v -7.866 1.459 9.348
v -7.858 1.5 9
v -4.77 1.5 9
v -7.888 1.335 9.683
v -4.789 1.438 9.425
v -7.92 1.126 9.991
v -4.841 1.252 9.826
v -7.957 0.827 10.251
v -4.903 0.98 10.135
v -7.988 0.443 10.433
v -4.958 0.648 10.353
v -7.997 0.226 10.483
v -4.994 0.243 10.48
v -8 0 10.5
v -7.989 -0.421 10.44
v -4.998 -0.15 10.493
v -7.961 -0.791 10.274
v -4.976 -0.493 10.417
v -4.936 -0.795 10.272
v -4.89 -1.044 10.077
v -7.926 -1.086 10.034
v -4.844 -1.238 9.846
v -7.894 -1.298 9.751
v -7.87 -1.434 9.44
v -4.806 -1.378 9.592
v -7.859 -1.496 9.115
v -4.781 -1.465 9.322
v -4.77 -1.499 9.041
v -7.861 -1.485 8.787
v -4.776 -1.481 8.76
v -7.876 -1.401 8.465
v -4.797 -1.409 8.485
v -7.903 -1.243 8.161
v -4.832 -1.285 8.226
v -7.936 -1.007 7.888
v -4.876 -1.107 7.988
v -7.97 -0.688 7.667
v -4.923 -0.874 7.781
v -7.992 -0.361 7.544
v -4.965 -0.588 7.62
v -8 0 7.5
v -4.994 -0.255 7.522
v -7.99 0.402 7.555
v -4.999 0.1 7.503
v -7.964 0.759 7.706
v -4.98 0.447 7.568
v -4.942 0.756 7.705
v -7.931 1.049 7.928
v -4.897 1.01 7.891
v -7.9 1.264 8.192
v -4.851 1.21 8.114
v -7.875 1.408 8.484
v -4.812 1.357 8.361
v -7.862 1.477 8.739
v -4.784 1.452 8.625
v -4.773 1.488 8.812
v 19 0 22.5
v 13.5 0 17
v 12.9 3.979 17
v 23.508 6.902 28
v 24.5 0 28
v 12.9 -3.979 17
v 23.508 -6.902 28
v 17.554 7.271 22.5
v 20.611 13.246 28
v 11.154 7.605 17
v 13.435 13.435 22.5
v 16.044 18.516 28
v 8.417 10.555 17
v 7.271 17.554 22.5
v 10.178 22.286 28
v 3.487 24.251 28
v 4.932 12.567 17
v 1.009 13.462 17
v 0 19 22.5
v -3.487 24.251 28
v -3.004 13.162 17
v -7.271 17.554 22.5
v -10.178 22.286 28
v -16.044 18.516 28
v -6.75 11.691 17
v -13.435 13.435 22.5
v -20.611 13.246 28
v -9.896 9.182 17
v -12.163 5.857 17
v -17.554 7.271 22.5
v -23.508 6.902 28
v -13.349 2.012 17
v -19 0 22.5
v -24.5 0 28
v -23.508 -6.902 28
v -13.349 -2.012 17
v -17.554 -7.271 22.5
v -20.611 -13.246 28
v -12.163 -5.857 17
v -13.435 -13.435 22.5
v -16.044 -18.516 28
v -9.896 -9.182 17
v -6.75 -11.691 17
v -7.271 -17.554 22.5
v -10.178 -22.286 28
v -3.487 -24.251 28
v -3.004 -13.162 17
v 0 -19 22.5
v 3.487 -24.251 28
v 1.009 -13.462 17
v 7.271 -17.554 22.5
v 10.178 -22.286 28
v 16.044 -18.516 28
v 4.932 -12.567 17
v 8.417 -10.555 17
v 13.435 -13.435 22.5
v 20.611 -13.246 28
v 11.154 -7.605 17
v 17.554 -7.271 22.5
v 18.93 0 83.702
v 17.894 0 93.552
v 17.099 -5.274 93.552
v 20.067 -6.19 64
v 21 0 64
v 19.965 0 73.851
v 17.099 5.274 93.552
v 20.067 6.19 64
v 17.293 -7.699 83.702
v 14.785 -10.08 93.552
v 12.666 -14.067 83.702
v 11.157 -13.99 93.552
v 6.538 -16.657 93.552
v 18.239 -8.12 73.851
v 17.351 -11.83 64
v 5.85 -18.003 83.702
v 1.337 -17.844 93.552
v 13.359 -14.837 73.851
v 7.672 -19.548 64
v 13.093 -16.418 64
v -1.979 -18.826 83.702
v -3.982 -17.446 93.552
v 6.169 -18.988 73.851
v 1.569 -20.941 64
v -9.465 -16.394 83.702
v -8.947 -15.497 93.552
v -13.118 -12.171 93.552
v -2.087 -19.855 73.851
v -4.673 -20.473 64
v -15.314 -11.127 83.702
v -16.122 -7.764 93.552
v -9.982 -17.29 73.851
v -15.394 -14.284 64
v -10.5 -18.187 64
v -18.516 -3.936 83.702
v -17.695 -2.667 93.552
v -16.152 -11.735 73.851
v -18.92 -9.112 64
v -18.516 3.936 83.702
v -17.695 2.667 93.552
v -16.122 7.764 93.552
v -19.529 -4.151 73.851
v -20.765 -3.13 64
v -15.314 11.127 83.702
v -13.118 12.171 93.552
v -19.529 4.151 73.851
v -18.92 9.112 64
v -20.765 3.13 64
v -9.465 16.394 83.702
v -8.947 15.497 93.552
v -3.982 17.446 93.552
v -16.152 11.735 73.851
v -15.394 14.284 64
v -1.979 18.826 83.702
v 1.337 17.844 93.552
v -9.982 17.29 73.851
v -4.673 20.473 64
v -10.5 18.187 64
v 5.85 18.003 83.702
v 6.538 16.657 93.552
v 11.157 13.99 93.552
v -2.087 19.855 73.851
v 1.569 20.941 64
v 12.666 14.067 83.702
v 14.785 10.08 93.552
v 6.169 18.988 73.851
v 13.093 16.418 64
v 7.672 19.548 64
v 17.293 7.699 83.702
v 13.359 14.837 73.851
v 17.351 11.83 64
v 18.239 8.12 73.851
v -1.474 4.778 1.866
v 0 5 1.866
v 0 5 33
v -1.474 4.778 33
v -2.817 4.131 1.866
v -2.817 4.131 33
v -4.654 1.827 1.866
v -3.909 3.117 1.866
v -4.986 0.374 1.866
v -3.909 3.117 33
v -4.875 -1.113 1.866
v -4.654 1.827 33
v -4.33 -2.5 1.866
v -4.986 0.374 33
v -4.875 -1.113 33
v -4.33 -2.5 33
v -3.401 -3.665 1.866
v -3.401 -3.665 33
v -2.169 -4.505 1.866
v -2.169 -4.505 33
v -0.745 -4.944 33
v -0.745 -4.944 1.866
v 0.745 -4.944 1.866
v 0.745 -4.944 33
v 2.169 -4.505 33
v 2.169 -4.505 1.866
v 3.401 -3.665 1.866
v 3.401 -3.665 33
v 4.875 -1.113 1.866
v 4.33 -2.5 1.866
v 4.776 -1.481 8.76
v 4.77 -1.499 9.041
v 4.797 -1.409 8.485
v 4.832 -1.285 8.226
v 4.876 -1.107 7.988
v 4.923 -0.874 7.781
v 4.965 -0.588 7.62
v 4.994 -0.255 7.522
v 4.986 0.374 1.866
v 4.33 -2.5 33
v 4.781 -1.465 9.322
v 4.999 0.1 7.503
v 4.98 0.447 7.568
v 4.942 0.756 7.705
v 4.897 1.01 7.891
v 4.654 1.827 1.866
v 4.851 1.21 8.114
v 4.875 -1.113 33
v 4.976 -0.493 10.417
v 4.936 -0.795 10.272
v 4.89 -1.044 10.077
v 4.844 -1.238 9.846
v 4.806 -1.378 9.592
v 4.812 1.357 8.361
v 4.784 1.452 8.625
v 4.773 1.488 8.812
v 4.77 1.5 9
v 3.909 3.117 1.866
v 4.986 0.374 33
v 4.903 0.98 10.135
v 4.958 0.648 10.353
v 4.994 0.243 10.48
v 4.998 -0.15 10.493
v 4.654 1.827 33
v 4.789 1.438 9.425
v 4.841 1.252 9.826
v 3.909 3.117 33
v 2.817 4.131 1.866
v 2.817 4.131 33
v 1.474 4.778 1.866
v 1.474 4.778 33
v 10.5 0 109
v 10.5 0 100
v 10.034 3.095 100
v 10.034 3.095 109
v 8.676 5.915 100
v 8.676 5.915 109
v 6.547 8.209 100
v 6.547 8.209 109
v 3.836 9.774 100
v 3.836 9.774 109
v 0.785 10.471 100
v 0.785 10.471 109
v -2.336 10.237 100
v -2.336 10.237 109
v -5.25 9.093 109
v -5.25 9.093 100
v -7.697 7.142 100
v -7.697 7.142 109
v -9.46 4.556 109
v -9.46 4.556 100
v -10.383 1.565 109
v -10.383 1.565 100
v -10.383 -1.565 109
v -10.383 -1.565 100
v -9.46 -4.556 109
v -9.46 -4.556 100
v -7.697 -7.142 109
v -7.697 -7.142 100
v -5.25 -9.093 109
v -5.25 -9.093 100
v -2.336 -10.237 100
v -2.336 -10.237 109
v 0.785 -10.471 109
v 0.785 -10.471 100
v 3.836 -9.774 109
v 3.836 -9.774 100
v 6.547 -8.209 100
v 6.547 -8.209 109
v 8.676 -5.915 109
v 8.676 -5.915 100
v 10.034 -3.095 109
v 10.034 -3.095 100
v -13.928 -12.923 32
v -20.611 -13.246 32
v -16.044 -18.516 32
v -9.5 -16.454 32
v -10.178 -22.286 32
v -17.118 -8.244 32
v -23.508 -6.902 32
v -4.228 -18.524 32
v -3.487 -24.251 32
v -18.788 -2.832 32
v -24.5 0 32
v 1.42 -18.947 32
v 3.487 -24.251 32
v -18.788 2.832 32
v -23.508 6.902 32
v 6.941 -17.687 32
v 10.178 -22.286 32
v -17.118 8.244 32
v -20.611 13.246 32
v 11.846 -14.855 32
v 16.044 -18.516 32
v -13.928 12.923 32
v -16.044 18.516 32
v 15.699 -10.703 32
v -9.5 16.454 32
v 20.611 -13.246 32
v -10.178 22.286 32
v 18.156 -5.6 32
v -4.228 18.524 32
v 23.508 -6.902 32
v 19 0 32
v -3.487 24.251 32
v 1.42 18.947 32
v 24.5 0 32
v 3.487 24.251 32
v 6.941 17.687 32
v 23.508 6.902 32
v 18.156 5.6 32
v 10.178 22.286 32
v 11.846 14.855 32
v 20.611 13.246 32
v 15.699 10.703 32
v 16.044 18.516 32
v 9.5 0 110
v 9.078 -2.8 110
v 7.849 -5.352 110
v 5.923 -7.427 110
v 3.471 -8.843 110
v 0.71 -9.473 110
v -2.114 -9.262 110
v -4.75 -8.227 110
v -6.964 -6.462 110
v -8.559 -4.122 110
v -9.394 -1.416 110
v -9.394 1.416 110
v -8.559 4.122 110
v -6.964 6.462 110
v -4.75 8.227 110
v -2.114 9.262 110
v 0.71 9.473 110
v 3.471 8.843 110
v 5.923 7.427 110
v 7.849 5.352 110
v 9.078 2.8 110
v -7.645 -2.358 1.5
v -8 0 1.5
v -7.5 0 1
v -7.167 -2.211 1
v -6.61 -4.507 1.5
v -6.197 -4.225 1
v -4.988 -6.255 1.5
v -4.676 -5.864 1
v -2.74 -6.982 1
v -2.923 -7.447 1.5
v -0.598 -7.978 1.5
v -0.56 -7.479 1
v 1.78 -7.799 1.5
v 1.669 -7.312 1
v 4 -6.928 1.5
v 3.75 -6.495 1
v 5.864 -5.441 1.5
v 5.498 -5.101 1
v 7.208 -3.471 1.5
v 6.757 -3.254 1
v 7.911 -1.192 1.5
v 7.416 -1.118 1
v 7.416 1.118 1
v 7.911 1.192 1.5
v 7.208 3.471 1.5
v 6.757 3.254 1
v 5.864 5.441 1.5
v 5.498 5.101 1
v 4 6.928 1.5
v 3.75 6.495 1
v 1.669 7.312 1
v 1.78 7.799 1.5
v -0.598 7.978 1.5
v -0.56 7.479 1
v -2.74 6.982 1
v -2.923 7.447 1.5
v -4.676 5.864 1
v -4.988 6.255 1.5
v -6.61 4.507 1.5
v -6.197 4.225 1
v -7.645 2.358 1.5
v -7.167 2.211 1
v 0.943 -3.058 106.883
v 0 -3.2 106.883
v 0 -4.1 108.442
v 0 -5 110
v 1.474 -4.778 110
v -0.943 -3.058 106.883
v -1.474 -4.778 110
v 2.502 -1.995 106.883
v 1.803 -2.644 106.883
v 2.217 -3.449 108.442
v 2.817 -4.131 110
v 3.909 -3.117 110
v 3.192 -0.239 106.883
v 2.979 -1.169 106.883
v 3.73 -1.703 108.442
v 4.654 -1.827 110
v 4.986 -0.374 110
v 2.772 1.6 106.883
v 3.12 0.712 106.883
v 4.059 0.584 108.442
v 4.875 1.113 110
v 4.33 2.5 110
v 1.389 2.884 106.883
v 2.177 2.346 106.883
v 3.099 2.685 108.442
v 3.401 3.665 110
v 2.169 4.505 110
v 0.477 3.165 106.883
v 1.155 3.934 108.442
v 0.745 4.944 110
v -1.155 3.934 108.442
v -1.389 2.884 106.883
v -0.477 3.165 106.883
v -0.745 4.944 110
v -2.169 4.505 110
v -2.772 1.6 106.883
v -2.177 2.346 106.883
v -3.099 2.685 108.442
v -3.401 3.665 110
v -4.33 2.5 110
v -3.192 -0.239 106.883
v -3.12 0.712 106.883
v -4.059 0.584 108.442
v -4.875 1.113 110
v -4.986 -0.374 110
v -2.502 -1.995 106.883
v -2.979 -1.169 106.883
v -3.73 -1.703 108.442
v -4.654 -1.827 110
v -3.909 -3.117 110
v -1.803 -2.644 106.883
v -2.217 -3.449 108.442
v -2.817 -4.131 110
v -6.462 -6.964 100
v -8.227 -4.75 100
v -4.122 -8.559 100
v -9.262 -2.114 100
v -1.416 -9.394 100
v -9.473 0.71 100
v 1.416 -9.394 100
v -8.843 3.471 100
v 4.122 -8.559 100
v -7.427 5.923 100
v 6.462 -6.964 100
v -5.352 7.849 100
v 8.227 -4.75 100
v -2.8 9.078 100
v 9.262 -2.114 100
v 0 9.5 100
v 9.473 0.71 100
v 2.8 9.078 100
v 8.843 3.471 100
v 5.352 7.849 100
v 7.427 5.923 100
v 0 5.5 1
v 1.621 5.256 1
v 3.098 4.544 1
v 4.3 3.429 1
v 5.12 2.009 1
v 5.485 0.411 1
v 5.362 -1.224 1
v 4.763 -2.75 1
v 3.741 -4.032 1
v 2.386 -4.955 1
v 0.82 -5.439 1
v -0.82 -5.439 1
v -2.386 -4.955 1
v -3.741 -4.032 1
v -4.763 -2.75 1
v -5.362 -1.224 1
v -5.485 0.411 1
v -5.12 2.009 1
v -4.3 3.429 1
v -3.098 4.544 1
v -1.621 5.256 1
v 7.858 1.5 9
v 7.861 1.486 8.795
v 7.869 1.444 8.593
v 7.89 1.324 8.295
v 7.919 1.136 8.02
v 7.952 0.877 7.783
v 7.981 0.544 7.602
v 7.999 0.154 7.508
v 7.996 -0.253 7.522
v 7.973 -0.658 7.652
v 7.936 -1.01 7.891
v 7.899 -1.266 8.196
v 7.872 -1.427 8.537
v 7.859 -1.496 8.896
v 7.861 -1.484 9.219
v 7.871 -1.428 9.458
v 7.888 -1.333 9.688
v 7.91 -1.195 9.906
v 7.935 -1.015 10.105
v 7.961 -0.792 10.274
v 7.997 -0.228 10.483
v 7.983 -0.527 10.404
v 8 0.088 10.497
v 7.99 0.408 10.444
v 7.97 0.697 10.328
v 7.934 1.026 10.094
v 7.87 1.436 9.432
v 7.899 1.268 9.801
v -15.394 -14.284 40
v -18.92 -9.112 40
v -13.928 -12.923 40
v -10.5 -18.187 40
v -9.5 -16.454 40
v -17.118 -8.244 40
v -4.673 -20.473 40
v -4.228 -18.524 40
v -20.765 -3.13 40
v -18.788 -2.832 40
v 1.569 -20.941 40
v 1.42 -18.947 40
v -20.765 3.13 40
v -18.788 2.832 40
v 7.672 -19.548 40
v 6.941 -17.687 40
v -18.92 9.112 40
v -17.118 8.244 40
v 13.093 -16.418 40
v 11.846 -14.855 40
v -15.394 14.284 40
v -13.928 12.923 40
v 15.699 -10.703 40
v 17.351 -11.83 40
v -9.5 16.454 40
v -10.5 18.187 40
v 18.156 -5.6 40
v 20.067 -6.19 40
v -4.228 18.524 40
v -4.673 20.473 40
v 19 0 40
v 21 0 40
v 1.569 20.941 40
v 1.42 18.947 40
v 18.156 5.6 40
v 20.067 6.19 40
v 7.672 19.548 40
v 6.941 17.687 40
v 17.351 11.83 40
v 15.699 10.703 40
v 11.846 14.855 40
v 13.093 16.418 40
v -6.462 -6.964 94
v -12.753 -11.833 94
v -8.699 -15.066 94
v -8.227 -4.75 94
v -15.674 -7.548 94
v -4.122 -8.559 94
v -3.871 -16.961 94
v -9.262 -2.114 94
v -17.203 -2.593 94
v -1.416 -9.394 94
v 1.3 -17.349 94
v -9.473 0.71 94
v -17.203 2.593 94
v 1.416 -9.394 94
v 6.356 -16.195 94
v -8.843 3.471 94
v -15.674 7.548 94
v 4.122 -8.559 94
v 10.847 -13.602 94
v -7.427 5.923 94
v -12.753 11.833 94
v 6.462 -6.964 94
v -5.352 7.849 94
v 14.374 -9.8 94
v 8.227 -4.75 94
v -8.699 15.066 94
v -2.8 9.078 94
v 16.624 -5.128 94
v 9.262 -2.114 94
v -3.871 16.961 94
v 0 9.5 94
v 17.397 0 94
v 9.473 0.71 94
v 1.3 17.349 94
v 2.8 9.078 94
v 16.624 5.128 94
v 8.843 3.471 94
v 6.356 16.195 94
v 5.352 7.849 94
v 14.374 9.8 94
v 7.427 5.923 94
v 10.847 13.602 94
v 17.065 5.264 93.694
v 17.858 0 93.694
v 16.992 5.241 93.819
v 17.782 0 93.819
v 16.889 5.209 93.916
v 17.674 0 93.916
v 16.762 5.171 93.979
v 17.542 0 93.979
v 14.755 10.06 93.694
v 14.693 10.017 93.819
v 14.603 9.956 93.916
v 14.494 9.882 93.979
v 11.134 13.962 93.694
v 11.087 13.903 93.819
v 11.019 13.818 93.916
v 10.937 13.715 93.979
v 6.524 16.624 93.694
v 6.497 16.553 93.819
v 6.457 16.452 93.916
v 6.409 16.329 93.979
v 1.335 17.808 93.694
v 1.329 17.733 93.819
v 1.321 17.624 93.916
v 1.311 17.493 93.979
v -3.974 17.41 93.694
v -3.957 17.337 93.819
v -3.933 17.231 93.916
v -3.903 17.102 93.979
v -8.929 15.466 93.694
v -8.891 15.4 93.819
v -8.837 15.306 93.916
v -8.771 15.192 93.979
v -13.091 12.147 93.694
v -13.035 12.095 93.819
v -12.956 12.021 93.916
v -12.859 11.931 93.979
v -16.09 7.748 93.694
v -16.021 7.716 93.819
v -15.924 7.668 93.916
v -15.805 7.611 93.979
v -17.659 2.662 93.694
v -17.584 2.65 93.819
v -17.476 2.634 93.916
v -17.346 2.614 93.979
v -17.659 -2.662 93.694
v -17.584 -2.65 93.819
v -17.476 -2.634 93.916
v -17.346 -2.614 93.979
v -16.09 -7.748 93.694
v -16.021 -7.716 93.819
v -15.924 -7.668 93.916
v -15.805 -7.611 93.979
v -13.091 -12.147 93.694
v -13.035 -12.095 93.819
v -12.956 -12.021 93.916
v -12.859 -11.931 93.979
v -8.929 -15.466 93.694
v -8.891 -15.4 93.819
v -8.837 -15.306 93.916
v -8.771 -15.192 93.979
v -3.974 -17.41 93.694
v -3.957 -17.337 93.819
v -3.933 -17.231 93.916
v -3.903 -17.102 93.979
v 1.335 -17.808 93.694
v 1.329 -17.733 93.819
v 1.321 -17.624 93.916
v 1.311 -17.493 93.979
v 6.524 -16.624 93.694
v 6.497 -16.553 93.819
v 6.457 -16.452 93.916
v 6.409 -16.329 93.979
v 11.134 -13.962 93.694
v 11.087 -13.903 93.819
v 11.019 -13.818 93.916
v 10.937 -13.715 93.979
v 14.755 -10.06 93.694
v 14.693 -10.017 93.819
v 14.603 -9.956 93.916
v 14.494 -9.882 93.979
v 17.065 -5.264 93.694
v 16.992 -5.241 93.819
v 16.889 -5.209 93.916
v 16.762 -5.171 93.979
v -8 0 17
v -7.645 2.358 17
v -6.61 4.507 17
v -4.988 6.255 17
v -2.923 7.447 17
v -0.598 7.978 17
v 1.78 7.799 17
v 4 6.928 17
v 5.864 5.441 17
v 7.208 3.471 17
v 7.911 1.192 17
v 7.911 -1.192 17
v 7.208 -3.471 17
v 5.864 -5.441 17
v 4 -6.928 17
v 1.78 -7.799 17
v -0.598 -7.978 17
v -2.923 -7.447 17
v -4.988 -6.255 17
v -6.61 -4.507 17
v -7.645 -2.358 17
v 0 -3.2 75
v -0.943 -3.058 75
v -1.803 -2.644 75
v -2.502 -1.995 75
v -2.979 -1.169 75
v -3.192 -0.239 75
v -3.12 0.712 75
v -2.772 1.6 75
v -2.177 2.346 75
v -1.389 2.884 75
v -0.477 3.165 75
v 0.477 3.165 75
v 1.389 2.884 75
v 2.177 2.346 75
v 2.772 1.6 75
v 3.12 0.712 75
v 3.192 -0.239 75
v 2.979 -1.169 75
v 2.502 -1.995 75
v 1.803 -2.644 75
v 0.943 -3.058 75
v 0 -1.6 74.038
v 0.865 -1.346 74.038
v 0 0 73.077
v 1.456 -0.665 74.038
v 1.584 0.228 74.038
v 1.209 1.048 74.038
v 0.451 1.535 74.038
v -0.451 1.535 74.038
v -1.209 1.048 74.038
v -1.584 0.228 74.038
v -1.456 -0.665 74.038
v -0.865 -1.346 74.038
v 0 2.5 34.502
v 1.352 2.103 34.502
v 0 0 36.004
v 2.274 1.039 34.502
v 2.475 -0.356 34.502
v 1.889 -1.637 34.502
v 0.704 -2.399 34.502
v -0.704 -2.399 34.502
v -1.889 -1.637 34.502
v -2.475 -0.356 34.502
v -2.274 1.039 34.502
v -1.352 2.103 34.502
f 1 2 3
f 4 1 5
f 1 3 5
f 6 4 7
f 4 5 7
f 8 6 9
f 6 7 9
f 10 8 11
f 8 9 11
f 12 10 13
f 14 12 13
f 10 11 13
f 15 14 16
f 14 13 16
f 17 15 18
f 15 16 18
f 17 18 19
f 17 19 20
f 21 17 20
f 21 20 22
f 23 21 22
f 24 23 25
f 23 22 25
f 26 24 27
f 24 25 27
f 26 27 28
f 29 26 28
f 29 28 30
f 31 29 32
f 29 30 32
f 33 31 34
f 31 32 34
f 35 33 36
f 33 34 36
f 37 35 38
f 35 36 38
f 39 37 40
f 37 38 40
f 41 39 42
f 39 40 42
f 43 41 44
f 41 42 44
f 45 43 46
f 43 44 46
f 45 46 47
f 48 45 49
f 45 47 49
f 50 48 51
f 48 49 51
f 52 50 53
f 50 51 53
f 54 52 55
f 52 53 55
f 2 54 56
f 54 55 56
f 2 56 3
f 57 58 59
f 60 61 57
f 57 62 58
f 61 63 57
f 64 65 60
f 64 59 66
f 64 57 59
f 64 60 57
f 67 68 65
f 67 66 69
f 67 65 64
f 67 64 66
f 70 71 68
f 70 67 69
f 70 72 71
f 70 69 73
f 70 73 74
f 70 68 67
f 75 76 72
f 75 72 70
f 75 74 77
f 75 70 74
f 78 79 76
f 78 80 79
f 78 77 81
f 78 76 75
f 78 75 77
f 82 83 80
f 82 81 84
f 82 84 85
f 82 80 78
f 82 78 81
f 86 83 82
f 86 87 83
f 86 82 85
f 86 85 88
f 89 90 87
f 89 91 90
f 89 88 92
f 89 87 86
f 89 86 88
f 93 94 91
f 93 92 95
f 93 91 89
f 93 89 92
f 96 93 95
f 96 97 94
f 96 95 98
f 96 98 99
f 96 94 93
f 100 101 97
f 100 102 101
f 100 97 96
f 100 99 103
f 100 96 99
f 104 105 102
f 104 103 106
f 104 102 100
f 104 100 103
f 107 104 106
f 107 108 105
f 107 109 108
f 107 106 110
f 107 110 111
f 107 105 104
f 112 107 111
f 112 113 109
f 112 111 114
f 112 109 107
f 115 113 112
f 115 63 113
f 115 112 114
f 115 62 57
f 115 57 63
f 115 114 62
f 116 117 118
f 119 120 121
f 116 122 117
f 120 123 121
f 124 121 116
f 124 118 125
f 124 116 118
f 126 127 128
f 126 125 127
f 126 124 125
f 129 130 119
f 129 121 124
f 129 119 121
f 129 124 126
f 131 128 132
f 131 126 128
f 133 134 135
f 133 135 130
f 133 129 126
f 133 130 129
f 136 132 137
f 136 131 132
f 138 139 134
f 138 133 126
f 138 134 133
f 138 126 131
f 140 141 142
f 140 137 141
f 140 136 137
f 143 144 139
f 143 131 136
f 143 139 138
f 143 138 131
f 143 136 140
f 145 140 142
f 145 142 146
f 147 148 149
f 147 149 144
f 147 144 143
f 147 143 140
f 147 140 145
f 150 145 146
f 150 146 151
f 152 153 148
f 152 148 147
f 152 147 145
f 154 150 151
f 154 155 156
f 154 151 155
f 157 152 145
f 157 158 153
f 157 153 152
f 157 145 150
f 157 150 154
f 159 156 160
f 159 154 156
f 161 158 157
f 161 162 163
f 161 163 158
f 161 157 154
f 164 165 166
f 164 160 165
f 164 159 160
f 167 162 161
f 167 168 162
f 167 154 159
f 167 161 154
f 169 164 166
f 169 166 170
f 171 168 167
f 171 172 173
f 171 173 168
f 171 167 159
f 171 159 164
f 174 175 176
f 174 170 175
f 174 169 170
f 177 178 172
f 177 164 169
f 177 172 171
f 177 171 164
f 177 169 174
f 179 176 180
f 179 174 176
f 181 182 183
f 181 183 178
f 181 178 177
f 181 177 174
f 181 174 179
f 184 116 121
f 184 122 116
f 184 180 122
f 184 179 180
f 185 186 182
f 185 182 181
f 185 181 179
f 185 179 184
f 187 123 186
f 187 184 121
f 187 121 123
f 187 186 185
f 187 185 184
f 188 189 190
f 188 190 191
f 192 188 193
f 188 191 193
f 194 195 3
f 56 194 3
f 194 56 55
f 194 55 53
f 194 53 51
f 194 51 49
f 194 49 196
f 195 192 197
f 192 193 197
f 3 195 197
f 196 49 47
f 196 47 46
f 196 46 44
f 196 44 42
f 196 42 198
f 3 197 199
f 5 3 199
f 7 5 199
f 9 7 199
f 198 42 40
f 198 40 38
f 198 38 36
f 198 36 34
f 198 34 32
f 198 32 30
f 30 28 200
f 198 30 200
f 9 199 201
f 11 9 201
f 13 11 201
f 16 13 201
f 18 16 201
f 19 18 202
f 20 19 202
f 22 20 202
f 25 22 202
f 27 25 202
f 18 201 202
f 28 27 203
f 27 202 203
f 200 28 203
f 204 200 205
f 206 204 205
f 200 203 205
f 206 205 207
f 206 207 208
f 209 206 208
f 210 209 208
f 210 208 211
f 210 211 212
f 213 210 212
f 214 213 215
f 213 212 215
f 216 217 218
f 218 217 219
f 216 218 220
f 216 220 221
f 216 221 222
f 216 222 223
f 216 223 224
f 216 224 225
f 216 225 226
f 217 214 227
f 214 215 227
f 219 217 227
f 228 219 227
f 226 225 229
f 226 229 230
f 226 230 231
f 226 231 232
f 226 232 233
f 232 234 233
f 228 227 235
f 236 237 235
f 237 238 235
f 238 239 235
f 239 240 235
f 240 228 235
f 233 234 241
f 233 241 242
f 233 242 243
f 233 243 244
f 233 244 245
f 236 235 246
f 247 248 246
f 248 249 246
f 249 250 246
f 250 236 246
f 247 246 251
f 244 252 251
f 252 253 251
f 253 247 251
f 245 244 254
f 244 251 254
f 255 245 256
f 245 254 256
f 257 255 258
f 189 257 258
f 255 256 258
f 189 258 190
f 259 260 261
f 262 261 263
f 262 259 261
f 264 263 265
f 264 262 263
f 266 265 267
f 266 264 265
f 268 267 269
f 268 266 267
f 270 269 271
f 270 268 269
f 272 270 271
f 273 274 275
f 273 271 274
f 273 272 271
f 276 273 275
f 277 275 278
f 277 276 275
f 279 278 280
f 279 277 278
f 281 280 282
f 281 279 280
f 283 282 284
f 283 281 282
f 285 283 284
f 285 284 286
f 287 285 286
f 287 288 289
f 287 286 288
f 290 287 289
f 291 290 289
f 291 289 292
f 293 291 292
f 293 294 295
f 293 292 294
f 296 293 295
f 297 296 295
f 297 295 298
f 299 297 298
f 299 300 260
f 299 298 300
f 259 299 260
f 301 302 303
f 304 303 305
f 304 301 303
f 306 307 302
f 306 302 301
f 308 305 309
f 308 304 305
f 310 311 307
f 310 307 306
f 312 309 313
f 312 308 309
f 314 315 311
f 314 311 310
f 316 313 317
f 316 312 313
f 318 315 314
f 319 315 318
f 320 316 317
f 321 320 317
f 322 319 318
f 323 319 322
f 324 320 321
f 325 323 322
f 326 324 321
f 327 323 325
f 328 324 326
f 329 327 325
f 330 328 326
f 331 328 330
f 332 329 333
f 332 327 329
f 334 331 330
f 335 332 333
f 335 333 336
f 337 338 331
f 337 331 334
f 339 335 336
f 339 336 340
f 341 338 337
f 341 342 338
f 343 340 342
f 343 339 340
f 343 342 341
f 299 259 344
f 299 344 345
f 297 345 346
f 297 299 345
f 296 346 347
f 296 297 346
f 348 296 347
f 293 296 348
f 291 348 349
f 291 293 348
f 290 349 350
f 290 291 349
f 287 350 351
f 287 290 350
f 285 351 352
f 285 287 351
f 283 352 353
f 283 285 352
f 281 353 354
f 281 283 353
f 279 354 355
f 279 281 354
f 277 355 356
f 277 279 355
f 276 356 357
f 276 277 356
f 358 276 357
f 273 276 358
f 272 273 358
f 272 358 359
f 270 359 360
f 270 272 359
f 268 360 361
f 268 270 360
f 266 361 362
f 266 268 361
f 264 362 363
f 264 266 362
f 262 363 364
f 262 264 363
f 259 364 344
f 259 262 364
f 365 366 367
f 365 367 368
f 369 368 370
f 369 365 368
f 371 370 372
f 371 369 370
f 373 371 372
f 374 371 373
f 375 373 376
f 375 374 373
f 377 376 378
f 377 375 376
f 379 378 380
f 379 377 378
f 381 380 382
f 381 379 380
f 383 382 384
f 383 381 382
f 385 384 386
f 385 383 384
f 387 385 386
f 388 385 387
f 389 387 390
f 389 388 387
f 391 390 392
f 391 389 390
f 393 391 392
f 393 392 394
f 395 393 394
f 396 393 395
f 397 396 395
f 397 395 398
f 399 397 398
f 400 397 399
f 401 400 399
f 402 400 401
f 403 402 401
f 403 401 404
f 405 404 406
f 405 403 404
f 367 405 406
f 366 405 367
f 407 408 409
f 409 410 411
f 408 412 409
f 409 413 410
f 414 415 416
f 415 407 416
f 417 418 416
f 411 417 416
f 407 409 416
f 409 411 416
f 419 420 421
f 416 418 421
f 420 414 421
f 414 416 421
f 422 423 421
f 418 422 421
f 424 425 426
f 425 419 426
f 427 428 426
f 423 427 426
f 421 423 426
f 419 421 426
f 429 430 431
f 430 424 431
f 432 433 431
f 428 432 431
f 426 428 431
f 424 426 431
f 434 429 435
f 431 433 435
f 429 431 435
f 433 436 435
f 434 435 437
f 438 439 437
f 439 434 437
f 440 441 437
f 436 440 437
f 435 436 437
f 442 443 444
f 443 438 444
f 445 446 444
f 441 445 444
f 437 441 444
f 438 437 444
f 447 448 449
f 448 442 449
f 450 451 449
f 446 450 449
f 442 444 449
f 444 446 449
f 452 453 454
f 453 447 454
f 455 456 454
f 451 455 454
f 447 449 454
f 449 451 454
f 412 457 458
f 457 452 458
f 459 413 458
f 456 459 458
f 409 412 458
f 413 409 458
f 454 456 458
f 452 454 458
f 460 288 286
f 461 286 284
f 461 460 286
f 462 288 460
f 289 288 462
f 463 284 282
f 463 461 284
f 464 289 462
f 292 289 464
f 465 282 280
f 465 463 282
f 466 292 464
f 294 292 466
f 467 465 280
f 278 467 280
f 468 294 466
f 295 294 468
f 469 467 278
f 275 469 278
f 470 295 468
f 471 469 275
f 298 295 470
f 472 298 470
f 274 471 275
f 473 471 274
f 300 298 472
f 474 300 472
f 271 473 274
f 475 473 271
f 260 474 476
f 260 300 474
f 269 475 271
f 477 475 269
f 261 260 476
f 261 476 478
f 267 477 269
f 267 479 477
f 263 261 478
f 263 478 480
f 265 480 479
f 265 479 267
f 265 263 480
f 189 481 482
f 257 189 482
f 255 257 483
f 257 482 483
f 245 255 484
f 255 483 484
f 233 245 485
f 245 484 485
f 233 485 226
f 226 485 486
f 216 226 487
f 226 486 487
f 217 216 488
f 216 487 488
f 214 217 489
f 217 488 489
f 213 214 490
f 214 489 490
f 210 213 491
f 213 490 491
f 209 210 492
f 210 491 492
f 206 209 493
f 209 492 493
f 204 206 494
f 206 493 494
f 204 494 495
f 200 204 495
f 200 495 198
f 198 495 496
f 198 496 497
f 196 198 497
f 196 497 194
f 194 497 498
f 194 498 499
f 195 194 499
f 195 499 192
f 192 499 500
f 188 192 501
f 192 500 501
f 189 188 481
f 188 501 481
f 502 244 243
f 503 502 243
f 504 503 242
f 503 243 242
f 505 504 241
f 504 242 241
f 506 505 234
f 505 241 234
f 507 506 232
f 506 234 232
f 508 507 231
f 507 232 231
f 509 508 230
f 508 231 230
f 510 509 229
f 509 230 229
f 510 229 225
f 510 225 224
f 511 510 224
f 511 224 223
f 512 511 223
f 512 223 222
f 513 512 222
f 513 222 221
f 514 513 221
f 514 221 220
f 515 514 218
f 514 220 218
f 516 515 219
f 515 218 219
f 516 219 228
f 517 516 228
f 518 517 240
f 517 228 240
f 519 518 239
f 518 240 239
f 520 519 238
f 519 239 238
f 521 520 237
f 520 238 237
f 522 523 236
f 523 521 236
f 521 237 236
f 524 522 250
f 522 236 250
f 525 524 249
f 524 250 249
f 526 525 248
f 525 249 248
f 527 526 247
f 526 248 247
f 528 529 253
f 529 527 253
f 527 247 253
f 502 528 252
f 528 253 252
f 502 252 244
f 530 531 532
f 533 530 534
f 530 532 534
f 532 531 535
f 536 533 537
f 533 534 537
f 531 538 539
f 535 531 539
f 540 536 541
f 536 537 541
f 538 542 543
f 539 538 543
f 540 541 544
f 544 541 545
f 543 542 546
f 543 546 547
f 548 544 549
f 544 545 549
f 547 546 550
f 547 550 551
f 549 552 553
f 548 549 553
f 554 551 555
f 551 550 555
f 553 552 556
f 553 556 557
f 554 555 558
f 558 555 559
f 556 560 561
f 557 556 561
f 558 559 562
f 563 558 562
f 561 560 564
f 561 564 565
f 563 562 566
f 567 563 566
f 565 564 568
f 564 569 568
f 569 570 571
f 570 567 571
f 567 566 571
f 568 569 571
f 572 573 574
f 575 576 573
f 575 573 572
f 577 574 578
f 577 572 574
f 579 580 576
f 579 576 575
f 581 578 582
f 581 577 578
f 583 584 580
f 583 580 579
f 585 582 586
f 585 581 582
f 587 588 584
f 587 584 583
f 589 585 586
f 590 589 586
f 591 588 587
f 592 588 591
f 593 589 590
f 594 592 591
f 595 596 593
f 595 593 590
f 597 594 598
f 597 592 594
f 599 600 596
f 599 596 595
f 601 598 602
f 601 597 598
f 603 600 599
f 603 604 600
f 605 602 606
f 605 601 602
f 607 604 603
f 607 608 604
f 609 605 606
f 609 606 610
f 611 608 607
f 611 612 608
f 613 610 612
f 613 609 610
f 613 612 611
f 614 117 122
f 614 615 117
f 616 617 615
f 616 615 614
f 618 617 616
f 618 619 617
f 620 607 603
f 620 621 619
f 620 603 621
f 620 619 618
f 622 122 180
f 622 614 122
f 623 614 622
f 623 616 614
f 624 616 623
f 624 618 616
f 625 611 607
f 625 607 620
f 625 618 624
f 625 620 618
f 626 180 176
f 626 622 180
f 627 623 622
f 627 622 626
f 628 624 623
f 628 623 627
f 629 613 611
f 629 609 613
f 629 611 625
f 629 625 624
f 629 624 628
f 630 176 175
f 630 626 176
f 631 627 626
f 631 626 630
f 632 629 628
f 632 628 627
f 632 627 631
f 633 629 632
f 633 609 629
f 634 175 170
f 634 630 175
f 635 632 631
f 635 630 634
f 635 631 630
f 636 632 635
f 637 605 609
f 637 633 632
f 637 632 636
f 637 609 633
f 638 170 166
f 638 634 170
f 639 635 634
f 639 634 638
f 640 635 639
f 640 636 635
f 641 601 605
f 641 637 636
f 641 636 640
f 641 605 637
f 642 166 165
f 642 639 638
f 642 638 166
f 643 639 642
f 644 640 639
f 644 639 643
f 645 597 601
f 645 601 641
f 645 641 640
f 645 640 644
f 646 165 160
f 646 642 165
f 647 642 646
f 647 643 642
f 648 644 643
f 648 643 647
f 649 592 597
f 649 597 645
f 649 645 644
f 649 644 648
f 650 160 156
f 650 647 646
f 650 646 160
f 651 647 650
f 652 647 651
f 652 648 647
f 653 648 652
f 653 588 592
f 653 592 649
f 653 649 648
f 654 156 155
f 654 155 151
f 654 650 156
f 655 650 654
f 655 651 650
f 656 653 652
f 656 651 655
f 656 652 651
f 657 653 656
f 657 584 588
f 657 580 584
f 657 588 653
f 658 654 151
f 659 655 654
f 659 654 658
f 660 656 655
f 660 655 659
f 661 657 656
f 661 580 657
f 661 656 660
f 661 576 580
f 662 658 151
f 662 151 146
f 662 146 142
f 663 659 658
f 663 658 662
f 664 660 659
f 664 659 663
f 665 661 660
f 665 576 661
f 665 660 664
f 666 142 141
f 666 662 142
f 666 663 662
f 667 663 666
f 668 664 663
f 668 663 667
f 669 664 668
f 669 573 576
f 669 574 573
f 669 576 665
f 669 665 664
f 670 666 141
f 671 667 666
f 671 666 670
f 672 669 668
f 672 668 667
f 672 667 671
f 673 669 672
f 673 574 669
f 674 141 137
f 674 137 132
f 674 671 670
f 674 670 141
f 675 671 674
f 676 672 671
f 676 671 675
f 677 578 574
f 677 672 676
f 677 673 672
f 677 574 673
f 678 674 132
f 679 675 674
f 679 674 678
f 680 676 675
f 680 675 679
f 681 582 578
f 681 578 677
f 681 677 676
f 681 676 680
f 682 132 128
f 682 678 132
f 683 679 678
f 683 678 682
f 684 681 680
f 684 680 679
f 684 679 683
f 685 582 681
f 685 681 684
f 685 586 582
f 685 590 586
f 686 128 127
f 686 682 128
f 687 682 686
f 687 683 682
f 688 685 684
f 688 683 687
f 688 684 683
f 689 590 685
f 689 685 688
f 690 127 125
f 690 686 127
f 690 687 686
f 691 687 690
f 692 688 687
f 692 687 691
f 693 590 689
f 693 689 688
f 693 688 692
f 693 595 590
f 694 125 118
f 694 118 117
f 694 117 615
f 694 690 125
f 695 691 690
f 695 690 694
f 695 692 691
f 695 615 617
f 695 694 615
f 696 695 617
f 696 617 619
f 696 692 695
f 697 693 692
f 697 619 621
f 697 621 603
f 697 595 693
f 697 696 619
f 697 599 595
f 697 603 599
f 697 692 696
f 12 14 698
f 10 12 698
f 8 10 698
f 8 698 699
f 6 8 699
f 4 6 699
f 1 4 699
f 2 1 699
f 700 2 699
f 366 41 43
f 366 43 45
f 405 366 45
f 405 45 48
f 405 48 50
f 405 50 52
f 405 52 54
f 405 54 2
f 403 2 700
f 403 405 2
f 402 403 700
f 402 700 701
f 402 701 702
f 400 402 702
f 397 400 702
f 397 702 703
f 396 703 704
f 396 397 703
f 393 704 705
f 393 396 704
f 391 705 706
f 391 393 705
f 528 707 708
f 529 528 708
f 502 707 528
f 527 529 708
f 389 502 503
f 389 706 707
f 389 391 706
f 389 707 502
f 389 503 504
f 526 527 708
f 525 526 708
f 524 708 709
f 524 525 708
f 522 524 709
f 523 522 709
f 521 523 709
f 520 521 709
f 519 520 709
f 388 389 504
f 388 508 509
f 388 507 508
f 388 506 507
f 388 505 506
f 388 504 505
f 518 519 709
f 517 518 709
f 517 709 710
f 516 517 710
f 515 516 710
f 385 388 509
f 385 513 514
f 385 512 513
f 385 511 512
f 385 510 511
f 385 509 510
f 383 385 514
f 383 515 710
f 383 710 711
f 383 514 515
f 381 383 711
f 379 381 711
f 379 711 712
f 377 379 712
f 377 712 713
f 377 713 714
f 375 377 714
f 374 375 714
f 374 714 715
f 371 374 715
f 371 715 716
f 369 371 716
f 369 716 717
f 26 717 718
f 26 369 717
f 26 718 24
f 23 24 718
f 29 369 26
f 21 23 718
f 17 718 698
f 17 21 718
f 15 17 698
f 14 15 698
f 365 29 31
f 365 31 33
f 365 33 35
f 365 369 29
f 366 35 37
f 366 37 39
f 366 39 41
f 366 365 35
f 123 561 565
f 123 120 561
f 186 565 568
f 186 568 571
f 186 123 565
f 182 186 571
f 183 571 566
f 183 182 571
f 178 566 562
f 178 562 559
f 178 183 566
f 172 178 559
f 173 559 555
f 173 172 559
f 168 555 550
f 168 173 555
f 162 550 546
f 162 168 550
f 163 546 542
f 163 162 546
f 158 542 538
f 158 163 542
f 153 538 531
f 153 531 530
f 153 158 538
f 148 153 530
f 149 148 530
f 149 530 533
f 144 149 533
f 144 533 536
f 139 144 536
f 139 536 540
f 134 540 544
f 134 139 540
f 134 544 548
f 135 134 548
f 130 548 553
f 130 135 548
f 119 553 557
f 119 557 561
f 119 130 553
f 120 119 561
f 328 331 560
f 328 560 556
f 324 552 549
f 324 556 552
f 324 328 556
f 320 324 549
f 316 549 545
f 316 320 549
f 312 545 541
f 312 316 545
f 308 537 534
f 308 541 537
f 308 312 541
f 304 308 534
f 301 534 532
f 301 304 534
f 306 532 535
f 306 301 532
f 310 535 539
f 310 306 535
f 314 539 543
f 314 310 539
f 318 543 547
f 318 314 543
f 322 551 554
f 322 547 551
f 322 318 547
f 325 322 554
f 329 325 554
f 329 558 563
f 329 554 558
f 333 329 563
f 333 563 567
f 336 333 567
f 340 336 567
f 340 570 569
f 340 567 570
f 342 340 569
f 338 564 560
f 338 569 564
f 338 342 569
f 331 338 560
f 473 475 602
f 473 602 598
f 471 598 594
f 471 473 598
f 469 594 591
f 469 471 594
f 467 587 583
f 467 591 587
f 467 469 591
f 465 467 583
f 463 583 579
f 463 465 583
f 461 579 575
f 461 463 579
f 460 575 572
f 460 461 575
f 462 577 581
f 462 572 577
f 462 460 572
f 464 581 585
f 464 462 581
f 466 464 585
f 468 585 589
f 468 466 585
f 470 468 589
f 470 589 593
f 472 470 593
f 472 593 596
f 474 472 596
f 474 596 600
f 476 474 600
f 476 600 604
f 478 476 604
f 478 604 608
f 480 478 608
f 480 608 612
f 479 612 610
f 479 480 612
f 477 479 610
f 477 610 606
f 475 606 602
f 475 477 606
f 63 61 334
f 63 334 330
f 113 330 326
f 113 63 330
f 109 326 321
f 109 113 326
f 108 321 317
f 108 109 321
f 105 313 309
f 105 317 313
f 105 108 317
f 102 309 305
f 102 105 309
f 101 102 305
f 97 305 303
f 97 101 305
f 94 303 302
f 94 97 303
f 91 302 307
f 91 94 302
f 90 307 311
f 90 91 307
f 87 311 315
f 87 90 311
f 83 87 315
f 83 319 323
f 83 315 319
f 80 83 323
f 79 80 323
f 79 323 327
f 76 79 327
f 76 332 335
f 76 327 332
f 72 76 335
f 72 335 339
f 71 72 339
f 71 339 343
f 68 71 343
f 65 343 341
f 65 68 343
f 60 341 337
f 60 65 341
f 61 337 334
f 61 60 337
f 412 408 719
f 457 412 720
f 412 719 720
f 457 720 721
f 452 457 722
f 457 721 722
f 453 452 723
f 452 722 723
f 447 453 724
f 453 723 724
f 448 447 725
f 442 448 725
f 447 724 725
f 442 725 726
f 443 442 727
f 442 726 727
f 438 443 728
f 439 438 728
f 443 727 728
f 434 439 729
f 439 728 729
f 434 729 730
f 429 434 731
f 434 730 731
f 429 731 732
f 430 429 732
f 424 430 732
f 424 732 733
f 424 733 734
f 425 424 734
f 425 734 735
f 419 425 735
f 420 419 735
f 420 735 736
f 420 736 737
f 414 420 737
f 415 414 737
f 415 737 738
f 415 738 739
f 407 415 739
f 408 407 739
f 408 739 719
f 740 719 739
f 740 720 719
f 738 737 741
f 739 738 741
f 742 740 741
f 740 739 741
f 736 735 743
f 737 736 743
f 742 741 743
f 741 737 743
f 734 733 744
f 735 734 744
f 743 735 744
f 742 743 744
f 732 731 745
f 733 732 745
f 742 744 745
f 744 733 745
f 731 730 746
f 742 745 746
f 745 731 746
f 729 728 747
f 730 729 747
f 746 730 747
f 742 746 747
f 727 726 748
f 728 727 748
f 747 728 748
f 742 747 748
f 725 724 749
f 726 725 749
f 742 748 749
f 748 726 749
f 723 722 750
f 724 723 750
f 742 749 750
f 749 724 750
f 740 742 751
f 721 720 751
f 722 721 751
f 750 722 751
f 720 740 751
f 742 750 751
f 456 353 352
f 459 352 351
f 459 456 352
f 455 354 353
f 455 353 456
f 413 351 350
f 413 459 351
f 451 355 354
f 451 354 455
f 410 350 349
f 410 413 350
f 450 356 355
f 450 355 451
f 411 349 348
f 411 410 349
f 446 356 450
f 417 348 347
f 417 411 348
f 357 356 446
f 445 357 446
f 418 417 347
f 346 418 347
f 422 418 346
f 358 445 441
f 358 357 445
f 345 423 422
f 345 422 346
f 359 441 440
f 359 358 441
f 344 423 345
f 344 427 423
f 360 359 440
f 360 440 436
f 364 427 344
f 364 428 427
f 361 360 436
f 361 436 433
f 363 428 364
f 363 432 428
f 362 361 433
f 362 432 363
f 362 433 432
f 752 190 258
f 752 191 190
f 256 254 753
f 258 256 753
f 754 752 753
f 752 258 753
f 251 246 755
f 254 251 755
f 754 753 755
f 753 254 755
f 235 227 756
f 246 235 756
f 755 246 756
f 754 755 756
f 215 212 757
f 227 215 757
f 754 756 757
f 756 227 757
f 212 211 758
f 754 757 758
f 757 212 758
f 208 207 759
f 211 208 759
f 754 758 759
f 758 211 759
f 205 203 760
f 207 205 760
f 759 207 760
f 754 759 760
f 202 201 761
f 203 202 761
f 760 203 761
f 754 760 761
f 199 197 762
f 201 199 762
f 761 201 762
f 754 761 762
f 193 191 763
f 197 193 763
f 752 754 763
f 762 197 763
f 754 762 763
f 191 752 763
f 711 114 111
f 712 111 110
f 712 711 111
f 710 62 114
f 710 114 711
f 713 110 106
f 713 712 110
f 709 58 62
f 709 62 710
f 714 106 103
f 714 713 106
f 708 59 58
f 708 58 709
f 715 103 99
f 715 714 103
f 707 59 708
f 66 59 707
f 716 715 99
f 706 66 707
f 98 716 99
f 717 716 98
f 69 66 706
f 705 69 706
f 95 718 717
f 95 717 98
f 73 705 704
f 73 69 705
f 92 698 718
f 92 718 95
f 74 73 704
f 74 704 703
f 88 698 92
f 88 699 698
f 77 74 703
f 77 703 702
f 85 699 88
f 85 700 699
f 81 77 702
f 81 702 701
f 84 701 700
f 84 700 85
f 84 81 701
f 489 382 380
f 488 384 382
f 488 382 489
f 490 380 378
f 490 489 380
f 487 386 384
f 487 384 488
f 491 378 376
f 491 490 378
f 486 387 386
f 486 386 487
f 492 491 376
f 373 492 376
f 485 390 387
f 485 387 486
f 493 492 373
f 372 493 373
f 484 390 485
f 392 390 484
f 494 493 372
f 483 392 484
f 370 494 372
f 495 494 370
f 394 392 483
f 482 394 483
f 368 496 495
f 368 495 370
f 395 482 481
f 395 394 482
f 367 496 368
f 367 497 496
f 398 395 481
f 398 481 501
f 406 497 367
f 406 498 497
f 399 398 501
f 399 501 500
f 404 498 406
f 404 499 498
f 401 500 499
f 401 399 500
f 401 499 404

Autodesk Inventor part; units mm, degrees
ref_plane "YZ Plane" through (0, 0, 0) normal (1, 0, 0) x (0, 1, 0)
ref_plane "XZ Plane" through (0, 0, 0) normal (0, 1, 0) x (-1, 0, 0)
ref_plane "XY Plane" through (0, 0, 0) normal (0, 0, 1) x (1, 0, 0)
sketch "Sketch1" plane through (0, 0, 0) normal (0, 0, 1) x (1, 0, 0)
  circle A0 centre (0, 0) radius 24.5
  dimension "d0" = 49
extrude "Extrusion1" add sketch "Sketch1" along normal blind 110
sketch "Sketch2" plane through (0, 0, 110) normal (0, 0, 1) x (1, 0, 0)
  circle A0 centre (0, 0) radius 24.5 projected
  circle A1 centre (0, 0) radius 14
  dimension "d3" = 28
extrude "Extrusion2" cut sketch "Sketch2" against normal blind 15
sketch "Sketch3" plane through (0, 0, 95) normal (0, 0, 1) x (1, 0, 0)
  circle A0 centre (0, 0) radius 24.5 projected
  circle A1 centre (0, 0) radius 22
  dimension "d6" = 44
extrude "Extrusion3" cut sketch "Sketch3" against normal blind 60
sketch "Sketch4" plane through (0, 0, 0) normal (0, 0, -1) x (-1, 0, 0)
  circle A0 centre (0, 0) radius 24.5 projected
  circle A1 centre (0, 0) radius 10
  dimension "d9" = 20
extrude "Extrusion4" cut sketch "Sketch4" against normal blind 17
chamfer "Chamfer1" distance 11 angle 45 1 edges at (-24.5, 0, 17) measured on face at (19.3325, 2.7521, 17)
sketch "Sketch5" plane through (0, 0, 95) normal (0, 0, 1) x (1, 0, 0)
  circle A0 centre (0, 0) radius 22 projected
  circle A1 centre (0, 0) radius 14 projected
extrude "Extrusion5" cut sketch "Sketch5" against normal blind 1
sketch "Sketch6" plane through (0, 0, 0) normal (0, 0, -1) x (-1, 0, 0)
  circle A0 centre (0, 0) radius 10 projected
extrude "Extrusion6" cut sketch "Sketch6" against normal blind 1
sketch "Sketch7" plane through (0, 0, 1) normal (0, 0, -1) x (-1, 0, 0)
  circle A0 centre (0, 0) radius 10 projected
  circle A1 centre (0, 0) radius 8
  dimension "d22" = 16
extrude "Extrusion7" cut sketch "Sketch7" against normal blind 16
sketch "Sketch8" plane through (0, 0, 35) normal (0, 0, 1) x (1, 0, 0)
  circle A0 centre (0, 0) radius 22 projected
  circle A1 centre (0, 0) radius 24.5 projected
extrude "Extrusion8" cut sketch "Sketch8" against normal blind 3
sketch "Sketch9" plane through (0, 0, 0) normal (0, 1, 0) x (-1, 0, 0)
  line L0 (22, 32) -> (-22, 32) projected
  line L1 (-22, 40) -> (-19, 40)
  line L2 (-19, 40) -> (-19, 32)
  line L3 (-19, 32) -> (-22, 32)
  line L4 (-22, 32) -> (-22, 40)
  line L5 (0, 0) -> (0, 69)
  point P0 (22, 69)
  point P1 (-22, 69)
  dimension "d27" = 8
  dimension "d28" = 38
  dimension "d29" = 3
revolve "Revolution1" cut sketch "Sketch9" angle 360 about axis through (0, 0, 0) along (0, 0, 1)
sketch "Sketch11" plane through (0, 0, 94) normal (0, 0, 1) x (1, 0, 0)
  circle A0 centre (0, 0) radius 22 projected
  circle A1 centre (0, 0) radius 21
  dimension "d31" = 42
extrude "Extrusion9" cut sketch "Sketch11" against normal blind 30
chamfer "Chamfer3" distance 30 angle 6 1 edges at (-21, 0, 94) measured on face at (20.7281, -3.3686, 74)
sketch "Sketch12" plane through (0, 0, 64) normal (0, 0, 1) x (1, 0, 0)
  circle A0 centre (0, 0) radius 21 projected
  circle A1 centre (0, 0) radius 22 projected
extrude "Extrusion10" cut sketch "Sketch12" against normal blind 28
sketch "Sketch13" plane through (0, 0, 110) normal (0, 0, 1) x (1, 0, 0)
  circle A0 centre (0, 0) radius 14 projected
hole "Hole1" at (0, 0, 110) direction (0, 0, -1) diameter 6.401 depth 35 tip angle 118 countersink diameter 10 countersink angle 60 thread size "5/16-18 UNC" class "2B" standard "ANSI Unified Screw Threads"
sketch "Sketch14" plane through (0, 0, 1) normal (0, 0, -1) x (-1, 0, 0)
  circle A0 centre (0, 0) radius 8 projected
hole "Hole2" at (0, 0, 1) direction (0, 0, 1) diameter 10 depth 32 tip angle 118 countersink diameter 11 countersink angle 60
sketch "Sketch16" plane through (0, 0, 110) normal (0, 0, 1) x (1, 0, 0)
  circle A0 centre (0, 0) radius 14 projected
  circle A1 centre (0, 0) radius 10.5
  dimension "d56" = 21
extrude "Extrusion11" cut sketch "Sketch16" against normal blind 16
sketch "Sketch17" plane through (0, 0, 0) normal (1, 0, 0) x (0, 1, 0)
  line L0 (10.5, 94) -> (-10.5, 94) projected
  line L1 (10.5, 110) -> (-10.5, 110) projected
  line L2 (10.5, 94) -> (9.5, 94)
  line L3 (9.5, 94) -> (9.5, 100)
  line L4 (9.5, 100) -> (10.5, 100)
  line L5 (10.5, 100) -> (10.5, 94)
  line L6 (0, 110) -> (0, 0)
  dimension "d59" = 6
  dimension "d60" = 1
revolve "Revolution3" cut sketch "Sketch17" angle 360 about axis through (0, 0, 110) along (0, 0, -1)
thread "Thread1" size "7/8-14 UNF" class "2A" standard "ANSI Unified Screw Threads" full length
chamfer "Chamfer4" distance 1 angle 45 1 edges at (-10.5, 0, 110)
chamfer "Chamfer5" distance 0.5 angle 45 1 edges at (8, 0, 1)
fillet "Fillet1" radius 0.5 1 edges at (-17.8474, 0, 94)
sketch "Sketch18" plane through (0, 0, 0) normal (1, 0, 0) x (0, 1, 0)
  circle A0 centre (0, 9) radius 1.5
  line L0 (7.5, 1) -> (-7.5, 1) projected
  point P0 (0, 0)
  dimension "d71" = 3
  dimension "d72" = 8
extrude "Extrusion12" cut sketch "Sketch18" along normal mid plane 25
properties part number "EIXO DA BETONEIRA(21)" material "Carbon Steel"
